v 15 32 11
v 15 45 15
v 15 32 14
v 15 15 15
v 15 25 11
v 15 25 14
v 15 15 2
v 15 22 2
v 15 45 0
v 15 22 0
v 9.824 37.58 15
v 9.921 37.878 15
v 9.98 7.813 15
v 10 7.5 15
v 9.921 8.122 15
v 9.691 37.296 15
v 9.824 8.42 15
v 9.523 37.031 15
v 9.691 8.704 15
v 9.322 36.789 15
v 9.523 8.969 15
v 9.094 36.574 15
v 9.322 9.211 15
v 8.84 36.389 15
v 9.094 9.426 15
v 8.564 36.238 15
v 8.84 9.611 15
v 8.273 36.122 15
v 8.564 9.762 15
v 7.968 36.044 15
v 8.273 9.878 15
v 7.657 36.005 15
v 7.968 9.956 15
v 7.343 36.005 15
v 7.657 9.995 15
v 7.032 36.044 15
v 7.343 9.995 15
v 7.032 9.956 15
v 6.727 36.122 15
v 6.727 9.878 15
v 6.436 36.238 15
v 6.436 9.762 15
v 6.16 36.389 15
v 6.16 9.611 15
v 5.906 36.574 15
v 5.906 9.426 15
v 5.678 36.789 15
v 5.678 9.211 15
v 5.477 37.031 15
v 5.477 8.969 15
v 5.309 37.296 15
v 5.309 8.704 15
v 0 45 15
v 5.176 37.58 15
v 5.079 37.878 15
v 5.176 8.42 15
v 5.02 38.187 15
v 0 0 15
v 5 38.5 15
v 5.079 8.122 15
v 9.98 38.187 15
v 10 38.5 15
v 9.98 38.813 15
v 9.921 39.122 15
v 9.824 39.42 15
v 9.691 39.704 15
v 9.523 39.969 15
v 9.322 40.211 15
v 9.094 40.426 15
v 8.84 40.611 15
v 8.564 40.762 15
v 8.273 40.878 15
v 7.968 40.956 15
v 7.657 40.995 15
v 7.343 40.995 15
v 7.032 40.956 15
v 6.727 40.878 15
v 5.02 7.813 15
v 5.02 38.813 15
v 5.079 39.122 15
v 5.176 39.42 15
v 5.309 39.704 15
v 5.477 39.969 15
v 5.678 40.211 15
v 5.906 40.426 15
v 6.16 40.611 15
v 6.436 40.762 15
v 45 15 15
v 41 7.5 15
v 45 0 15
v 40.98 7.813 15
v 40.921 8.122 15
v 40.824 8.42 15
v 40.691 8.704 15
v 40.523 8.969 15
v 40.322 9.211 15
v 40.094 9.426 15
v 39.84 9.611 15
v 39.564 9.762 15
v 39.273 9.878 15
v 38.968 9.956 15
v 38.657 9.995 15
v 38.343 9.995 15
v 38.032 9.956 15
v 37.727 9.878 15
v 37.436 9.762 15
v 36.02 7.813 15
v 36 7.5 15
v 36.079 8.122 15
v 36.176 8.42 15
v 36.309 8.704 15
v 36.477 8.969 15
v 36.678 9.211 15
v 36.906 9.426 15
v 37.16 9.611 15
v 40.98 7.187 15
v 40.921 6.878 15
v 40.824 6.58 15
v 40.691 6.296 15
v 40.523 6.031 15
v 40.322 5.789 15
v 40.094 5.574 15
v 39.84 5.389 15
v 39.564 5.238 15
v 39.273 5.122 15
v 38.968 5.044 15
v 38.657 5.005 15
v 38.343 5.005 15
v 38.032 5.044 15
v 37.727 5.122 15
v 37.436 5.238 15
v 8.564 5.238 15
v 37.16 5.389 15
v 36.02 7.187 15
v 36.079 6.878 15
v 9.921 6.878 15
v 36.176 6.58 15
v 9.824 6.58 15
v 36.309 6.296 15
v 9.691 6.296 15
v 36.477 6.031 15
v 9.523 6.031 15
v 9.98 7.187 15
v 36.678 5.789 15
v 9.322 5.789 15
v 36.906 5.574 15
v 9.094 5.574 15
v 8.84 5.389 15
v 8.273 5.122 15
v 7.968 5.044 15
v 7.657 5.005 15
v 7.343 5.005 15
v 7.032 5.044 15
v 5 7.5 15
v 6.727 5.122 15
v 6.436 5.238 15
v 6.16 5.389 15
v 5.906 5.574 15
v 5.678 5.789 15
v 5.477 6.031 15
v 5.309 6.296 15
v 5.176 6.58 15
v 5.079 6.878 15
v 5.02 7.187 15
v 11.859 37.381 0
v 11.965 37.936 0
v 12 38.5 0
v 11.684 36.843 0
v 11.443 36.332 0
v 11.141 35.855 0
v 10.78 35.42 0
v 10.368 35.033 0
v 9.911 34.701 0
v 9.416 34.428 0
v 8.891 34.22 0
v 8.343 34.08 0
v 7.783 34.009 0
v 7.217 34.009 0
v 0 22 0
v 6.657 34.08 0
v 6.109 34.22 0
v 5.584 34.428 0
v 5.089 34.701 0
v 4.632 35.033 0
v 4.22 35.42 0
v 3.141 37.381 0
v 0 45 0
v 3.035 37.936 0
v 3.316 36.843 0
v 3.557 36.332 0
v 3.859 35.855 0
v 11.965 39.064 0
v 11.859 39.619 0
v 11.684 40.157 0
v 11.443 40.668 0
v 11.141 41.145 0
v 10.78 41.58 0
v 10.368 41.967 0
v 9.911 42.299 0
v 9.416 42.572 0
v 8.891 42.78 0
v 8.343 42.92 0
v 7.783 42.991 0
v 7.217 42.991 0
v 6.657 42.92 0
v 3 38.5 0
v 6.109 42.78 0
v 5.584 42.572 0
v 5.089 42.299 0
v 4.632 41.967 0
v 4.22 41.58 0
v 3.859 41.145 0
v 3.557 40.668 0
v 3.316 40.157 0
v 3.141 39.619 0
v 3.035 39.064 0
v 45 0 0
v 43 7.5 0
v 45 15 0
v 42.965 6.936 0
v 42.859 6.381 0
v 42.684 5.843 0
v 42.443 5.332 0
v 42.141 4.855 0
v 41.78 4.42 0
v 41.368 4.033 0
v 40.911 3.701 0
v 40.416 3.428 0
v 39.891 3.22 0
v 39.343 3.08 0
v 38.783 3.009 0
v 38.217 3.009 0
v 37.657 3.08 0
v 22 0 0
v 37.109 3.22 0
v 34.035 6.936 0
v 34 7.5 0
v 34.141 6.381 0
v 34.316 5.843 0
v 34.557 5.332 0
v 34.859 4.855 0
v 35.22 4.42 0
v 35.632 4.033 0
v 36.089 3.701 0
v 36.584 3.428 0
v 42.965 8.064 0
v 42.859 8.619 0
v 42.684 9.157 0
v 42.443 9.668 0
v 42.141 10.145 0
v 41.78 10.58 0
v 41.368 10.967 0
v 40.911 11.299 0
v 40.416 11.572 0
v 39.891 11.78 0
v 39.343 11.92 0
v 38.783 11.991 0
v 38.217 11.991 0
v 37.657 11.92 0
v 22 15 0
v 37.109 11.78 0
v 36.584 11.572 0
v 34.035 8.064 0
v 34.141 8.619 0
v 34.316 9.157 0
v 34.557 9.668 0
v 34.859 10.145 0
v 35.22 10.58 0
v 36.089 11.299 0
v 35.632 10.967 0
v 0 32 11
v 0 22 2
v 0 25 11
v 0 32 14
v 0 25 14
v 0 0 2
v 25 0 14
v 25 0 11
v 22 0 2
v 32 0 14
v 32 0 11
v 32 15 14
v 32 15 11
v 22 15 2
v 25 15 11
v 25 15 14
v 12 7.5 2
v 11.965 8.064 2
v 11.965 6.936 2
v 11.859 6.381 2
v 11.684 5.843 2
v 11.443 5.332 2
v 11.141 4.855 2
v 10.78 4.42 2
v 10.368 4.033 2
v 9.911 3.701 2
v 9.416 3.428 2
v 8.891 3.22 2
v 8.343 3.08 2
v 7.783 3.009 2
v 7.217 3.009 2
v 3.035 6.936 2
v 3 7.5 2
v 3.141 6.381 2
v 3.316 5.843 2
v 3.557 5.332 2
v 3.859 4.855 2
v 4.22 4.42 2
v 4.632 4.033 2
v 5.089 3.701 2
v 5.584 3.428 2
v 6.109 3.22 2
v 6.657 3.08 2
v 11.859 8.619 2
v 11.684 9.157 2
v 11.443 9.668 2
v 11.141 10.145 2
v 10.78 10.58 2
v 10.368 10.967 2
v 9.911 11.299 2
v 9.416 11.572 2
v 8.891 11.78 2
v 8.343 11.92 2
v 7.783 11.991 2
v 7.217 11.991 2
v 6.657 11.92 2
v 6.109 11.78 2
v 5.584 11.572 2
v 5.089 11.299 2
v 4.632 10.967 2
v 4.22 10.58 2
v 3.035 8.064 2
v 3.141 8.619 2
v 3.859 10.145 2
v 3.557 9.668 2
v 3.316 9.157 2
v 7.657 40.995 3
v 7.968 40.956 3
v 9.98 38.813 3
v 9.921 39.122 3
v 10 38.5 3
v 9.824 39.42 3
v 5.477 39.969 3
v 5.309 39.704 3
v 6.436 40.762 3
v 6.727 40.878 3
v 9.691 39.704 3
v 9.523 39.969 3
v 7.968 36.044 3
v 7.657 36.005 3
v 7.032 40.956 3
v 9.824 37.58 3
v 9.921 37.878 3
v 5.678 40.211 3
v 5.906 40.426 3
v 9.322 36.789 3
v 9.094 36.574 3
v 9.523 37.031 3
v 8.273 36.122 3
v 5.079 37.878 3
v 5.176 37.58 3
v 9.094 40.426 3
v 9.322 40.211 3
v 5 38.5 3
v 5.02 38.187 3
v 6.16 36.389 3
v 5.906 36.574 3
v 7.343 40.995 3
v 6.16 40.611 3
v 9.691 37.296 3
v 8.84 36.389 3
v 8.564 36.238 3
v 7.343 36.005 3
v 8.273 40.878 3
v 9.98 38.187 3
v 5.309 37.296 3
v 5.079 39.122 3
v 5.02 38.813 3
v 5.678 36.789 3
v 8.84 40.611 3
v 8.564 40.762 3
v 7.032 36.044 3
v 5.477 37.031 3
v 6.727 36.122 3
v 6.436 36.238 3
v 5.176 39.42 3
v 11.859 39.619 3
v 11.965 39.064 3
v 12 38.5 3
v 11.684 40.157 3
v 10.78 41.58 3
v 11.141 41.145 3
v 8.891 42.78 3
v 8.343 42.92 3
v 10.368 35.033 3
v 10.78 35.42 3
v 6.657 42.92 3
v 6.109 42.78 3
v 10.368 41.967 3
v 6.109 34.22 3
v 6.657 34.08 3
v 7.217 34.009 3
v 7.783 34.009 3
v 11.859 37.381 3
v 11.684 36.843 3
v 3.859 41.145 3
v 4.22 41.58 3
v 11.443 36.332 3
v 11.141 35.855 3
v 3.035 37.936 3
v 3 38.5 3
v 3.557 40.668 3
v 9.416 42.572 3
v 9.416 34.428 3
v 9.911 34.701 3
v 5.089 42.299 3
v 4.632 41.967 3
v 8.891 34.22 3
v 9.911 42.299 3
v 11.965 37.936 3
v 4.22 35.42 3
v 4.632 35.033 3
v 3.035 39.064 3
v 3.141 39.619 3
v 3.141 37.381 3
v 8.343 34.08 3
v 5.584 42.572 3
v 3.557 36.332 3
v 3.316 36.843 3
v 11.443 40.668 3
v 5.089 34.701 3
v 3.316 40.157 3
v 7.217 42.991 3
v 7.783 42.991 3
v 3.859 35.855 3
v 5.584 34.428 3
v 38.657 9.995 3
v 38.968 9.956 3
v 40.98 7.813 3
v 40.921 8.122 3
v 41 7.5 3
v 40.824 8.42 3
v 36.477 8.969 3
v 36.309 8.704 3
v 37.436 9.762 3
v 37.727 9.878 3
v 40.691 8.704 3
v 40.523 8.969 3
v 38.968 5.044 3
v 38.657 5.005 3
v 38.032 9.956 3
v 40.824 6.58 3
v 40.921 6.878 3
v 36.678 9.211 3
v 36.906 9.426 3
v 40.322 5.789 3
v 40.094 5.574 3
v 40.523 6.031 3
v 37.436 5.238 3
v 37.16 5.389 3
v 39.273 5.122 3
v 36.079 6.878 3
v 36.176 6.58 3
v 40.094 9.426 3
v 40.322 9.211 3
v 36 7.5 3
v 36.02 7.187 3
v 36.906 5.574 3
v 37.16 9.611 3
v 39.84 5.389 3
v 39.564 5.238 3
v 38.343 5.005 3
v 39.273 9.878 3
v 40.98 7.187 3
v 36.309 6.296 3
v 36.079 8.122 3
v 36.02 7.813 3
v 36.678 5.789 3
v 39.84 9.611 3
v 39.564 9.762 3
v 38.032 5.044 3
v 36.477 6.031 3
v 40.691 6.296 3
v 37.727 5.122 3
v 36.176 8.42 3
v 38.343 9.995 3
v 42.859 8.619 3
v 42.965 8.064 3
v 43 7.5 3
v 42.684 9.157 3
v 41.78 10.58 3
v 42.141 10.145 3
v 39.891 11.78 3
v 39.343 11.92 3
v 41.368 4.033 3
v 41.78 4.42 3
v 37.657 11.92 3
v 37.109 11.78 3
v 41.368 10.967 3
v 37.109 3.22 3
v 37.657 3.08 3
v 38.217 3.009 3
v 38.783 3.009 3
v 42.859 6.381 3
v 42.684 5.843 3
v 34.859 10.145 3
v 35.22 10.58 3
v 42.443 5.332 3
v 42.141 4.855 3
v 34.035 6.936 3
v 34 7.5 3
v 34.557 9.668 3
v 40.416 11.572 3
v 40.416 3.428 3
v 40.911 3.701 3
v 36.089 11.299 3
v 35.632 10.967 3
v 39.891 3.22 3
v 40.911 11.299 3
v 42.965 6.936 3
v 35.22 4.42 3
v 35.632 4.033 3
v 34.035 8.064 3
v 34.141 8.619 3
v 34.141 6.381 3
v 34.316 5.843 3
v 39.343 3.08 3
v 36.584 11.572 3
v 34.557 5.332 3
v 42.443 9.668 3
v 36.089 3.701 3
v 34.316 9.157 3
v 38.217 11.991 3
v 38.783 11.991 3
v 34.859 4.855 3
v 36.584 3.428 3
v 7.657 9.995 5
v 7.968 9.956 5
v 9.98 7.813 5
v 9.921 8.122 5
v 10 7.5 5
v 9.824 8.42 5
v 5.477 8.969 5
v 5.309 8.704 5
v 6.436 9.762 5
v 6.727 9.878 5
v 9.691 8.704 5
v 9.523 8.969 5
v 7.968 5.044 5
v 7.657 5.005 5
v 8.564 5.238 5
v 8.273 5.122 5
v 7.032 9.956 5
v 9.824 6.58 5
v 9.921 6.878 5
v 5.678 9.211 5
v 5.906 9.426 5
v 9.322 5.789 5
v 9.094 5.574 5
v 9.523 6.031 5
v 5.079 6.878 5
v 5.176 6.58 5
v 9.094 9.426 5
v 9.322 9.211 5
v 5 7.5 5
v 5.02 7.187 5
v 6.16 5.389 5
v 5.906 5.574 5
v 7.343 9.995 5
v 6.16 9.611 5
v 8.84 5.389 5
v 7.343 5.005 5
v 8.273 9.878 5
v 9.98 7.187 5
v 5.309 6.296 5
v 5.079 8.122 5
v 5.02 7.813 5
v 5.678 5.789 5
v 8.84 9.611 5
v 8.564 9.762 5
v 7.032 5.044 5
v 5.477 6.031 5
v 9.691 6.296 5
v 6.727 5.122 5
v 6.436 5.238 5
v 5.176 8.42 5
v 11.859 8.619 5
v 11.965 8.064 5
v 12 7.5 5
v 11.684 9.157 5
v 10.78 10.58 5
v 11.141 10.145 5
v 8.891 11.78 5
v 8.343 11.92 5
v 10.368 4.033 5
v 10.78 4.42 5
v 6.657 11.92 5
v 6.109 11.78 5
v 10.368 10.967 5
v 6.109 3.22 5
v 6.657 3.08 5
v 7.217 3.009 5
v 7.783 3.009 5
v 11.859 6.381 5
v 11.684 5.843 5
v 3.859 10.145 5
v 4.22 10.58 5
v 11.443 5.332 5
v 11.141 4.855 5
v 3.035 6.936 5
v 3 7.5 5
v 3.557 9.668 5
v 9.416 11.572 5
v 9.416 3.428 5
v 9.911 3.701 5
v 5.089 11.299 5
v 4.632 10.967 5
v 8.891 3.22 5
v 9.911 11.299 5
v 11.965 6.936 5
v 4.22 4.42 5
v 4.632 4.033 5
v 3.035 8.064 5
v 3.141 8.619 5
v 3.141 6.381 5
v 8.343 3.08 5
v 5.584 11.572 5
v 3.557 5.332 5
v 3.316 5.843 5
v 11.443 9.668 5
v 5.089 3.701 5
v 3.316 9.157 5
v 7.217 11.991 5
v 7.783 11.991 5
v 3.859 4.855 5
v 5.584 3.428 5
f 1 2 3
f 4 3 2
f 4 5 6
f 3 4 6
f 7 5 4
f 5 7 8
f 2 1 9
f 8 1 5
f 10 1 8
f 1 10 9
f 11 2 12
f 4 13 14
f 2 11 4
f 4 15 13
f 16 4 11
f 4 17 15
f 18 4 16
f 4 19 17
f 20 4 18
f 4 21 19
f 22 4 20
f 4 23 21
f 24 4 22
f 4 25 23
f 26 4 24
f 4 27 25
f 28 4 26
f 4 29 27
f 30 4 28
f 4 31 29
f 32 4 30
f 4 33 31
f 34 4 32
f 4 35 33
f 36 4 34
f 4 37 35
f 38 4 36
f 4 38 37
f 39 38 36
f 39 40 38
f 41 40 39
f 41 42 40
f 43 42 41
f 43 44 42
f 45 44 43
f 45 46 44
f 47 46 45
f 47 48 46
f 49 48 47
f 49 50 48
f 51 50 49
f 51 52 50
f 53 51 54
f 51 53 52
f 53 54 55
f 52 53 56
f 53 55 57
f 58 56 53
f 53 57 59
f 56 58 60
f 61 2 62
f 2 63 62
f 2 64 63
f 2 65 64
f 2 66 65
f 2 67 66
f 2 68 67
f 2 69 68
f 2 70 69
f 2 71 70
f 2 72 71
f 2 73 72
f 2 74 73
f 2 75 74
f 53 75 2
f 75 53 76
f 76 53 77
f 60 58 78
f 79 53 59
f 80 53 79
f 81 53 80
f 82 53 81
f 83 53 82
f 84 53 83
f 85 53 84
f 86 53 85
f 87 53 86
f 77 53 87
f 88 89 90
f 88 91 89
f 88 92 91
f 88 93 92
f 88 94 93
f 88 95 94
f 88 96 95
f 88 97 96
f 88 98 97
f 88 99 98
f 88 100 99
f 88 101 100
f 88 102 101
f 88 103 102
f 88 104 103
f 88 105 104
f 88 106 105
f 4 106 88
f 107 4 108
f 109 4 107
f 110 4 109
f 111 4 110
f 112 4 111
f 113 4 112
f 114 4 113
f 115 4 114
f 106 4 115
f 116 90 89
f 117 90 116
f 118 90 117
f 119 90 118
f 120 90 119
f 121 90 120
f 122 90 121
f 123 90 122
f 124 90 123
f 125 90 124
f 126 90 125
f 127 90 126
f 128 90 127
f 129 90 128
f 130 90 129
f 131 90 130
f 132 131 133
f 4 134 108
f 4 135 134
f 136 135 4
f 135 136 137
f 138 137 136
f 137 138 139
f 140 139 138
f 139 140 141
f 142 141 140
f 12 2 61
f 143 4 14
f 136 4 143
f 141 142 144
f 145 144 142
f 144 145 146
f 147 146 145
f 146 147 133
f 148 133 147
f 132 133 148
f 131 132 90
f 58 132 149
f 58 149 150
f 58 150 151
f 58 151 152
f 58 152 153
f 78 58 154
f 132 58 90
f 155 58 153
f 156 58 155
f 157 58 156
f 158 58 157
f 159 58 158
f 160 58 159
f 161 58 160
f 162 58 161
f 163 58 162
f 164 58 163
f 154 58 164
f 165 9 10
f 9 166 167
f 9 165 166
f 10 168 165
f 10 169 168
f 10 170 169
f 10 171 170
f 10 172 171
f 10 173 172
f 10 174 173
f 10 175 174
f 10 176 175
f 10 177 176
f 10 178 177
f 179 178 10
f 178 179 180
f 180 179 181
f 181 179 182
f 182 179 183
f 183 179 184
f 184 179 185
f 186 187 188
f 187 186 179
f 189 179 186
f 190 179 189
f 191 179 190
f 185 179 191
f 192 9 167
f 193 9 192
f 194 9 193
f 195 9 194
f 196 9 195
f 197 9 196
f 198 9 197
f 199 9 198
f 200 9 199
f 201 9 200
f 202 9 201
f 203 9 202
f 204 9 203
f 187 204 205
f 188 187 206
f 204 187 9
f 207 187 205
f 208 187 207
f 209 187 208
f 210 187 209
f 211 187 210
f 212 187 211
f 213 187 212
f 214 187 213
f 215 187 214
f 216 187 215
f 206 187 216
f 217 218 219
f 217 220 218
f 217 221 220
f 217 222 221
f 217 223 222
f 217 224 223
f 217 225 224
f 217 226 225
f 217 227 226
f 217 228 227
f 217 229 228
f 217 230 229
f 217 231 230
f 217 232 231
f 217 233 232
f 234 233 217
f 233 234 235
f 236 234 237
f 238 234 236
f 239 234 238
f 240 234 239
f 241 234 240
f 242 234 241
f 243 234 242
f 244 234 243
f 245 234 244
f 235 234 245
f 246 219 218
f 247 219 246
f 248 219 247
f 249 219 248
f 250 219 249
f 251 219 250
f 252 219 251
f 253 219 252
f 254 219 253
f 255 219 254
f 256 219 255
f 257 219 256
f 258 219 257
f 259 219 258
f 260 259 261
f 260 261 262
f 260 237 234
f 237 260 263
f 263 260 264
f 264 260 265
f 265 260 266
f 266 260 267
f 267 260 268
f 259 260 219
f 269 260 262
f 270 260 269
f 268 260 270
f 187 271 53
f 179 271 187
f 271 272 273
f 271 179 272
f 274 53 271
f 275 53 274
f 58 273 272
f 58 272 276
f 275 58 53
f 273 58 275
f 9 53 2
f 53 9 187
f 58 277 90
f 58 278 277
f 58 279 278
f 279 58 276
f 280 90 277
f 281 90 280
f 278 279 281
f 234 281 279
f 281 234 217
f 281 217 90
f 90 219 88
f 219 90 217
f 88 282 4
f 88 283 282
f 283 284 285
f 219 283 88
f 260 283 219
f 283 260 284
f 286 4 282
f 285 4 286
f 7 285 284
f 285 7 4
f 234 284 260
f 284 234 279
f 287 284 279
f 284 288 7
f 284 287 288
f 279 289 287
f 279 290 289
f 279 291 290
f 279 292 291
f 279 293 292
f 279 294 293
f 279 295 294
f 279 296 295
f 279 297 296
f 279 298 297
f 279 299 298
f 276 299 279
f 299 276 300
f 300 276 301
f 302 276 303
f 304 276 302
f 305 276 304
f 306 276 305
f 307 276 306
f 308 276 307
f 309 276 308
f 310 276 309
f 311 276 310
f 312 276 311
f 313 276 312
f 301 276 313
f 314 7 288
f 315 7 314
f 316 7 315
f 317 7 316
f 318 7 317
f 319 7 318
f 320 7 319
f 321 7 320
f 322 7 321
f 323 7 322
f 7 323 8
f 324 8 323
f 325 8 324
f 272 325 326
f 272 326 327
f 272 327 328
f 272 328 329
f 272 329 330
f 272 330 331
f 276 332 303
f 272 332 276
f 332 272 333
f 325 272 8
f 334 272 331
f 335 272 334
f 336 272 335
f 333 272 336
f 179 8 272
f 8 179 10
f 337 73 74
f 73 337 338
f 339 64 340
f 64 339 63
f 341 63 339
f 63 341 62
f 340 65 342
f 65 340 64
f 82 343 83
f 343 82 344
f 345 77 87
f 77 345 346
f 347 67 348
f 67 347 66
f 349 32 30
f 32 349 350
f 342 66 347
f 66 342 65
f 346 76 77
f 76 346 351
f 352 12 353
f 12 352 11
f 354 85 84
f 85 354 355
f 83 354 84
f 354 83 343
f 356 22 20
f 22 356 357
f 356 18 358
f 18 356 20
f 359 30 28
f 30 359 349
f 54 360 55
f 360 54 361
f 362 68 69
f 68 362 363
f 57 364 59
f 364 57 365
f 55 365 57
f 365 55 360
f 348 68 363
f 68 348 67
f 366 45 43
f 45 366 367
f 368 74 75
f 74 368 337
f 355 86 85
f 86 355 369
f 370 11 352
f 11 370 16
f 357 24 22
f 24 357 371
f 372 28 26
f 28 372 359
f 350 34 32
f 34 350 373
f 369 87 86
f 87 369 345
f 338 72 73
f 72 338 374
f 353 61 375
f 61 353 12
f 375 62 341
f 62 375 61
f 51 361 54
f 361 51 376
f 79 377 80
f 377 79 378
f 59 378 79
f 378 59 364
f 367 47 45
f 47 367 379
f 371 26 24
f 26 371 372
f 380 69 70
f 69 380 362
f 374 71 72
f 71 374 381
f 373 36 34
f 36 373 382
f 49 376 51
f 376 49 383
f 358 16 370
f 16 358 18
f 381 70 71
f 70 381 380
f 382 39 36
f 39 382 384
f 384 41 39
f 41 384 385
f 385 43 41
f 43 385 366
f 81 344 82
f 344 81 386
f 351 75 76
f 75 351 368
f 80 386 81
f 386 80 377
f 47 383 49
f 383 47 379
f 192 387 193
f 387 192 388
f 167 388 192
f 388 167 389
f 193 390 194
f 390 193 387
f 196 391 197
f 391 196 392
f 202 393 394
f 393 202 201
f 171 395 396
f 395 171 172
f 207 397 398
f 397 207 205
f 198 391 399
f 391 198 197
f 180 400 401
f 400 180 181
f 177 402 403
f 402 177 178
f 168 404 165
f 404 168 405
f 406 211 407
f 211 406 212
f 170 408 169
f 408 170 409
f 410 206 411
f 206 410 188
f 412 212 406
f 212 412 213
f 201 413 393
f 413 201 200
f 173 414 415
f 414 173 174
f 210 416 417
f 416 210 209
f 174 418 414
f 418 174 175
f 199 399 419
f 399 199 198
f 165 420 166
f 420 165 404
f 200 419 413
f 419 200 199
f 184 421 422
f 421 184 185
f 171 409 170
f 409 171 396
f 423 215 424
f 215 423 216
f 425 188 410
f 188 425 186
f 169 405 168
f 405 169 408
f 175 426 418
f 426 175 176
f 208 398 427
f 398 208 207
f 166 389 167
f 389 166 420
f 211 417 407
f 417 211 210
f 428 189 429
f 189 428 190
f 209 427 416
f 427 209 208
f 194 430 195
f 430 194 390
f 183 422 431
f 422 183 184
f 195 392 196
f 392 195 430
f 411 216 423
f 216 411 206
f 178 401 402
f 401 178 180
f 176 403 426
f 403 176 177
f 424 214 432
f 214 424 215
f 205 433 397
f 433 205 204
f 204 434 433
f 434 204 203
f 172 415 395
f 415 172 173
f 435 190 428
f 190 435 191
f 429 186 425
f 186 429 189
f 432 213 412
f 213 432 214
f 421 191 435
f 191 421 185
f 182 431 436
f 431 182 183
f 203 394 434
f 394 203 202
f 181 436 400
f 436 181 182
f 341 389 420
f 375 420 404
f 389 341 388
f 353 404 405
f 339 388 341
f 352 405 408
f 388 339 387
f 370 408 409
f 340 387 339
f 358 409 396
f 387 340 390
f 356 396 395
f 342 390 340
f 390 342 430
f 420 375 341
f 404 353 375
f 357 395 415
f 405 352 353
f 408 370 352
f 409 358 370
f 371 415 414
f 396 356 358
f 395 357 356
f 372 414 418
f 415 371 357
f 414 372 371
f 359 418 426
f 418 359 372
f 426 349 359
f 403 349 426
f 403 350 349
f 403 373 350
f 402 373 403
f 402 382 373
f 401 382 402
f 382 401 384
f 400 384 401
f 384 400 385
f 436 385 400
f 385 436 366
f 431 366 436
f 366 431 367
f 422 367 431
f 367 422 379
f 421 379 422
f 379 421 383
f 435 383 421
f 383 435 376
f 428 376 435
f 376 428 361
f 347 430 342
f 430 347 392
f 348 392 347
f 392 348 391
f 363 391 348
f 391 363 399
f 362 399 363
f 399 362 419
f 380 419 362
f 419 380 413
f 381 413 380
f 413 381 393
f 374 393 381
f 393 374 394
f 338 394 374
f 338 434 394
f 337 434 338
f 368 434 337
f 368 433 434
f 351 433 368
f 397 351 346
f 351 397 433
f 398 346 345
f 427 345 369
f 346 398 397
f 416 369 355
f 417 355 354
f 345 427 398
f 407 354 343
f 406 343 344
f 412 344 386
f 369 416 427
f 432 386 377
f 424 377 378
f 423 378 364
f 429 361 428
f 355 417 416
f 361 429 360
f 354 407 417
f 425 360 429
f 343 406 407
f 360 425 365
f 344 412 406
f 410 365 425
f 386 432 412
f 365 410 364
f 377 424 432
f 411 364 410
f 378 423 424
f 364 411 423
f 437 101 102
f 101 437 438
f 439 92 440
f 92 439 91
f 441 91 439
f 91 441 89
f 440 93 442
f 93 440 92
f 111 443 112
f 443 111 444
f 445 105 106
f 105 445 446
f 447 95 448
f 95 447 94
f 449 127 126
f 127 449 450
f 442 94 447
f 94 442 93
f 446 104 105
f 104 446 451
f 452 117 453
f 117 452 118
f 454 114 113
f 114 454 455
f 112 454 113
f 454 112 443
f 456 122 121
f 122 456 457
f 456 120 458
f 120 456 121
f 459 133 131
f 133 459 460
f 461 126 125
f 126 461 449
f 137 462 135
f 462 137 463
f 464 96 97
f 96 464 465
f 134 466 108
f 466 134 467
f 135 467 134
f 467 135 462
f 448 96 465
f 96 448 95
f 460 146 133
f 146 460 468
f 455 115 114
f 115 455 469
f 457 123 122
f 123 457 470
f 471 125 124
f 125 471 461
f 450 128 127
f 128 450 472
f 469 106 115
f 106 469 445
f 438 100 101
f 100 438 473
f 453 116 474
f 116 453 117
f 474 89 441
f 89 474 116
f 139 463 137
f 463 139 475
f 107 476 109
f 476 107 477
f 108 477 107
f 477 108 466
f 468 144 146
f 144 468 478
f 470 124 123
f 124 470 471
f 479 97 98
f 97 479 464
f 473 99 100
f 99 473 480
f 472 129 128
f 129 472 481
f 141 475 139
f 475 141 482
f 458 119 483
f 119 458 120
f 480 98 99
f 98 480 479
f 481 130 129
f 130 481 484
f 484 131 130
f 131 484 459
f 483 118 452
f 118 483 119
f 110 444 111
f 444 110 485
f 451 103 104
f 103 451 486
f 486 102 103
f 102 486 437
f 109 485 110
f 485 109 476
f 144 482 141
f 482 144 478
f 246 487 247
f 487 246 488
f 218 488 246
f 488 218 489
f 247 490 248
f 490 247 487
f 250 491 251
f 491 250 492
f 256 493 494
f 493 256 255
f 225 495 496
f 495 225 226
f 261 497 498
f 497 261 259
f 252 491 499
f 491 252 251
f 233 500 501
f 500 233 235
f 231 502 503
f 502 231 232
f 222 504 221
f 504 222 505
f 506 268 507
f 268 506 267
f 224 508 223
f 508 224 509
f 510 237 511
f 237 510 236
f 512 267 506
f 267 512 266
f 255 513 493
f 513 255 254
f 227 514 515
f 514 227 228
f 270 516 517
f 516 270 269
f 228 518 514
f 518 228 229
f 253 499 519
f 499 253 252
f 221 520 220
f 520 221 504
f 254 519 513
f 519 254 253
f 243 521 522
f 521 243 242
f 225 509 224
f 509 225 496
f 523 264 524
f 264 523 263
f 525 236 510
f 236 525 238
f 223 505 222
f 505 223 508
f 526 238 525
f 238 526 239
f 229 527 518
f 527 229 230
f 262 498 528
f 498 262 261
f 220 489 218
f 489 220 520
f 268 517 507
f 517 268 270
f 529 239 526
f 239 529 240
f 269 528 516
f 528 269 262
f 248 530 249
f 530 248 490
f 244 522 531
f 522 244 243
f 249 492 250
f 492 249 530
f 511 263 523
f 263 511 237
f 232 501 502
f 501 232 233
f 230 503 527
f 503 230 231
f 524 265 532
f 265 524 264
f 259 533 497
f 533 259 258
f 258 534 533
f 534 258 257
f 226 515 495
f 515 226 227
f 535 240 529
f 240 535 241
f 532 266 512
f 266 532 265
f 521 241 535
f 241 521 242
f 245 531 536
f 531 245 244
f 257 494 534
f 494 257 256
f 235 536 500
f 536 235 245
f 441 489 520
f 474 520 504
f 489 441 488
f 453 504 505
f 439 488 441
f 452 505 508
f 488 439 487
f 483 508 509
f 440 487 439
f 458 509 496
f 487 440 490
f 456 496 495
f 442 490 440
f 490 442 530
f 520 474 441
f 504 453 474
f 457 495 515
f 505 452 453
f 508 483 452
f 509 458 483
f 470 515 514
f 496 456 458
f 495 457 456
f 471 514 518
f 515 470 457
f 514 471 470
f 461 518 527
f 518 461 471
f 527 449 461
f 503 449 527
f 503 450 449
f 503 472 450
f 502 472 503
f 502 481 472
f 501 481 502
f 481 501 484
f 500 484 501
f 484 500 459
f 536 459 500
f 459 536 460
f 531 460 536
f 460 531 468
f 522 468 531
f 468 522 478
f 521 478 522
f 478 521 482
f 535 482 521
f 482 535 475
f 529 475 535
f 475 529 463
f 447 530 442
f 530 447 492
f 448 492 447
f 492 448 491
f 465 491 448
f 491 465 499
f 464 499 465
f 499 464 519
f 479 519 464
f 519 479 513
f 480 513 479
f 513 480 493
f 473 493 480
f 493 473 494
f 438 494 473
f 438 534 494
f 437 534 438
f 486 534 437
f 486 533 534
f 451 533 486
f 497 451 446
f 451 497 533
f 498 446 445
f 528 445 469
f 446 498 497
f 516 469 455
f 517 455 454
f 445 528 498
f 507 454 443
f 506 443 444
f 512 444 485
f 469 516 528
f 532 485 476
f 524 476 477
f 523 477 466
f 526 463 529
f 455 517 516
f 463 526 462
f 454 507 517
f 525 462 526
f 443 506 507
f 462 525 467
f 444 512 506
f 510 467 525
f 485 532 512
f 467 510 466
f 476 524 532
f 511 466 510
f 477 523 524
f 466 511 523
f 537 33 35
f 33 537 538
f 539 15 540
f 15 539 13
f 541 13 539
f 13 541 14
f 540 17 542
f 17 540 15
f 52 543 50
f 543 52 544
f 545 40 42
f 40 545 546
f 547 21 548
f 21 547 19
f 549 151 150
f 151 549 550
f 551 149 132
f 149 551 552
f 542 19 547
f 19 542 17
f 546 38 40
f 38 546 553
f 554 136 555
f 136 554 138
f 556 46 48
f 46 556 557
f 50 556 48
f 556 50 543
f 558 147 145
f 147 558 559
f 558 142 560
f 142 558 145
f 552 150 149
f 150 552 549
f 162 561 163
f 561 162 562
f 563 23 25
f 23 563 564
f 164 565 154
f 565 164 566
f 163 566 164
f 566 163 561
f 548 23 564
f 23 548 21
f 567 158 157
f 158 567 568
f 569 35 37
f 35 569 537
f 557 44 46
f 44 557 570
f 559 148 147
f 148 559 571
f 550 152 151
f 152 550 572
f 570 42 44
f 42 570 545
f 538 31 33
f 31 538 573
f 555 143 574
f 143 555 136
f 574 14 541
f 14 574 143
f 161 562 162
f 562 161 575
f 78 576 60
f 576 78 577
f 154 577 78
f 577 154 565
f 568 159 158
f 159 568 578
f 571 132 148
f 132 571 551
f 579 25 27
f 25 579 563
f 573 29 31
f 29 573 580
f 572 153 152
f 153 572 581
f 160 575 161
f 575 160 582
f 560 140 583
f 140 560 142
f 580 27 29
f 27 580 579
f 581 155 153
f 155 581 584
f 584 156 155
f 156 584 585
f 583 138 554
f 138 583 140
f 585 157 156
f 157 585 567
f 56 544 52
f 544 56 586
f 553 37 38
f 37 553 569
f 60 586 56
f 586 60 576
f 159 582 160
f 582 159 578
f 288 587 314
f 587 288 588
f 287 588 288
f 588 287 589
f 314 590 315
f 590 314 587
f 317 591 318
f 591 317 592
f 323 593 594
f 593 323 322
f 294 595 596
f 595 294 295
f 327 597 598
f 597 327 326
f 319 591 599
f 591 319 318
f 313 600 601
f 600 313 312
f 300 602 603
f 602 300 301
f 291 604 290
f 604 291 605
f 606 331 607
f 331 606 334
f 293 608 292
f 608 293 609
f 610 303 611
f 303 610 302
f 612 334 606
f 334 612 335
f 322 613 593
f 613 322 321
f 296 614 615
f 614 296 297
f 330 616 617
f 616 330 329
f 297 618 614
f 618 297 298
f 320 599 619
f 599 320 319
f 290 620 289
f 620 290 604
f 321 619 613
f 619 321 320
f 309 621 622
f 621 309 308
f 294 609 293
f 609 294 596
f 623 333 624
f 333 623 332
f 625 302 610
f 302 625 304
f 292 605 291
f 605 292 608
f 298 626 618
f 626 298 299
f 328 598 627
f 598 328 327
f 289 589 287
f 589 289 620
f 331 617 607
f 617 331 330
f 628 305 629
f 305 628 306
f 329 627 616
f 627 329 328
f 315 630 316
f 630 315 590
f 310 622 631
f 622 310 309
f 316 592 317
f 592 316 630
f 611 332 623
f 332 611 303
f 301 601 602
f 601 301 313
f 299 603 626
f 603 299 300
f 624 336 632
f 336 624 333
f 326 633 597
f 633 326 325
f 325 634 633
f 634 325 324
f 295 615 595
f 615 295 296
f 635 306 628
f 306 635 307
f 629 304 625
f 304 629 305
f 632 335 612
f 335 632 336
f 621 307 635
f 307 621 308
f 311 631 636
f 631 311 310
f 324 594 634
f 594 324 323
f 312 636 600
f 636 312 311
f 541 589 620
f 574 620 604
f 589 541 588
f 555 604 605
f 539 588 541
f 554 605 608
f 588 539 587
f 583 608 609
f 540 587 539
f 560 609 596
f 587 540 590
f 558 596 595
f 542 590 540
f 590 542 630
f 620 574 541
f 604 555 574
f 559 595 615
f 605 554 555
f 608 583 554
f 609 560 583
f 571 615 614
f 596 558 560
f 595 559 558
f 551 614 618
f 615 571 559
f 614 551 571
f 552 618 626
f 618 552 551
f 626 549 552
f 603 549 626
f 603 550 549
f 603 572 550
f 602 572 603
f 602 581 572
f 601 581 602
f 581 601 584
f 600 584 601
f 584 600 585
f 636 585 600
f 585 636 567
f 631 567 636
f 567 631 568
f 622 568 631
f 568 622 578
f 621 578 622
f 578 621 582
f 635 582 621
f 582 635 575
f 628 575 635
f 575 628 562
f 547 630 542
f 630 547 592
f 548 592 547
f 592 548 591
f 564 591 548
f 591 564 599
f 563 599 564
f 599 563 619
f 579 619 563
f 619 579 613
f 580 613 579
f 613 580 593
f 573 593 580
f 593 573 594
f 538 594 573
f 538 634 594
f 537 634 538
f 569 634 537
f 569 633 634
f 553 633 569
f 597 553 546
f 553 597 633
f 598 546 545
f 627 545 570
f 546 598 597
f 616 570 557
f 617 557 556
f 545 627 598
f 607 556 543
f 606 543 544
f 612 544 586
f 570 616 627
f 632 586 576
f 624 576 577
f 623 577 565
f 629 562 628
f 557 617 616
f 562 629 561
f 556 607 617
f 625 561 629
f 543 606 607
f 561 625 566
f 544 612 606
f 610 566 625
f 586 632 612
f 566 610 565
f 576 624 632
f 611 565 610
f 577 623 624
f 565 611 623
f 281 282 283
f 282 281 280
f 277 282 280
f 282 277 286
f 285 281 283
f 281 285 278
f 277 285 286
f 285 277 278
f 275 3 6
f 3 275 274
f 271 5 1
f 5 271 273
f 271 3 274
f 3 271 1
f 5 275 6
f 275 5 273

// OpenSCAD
w = 15;
l = 45;
h = 15;
strap_h = 3;
strap_w = 7;
strap_inset = 1;

head_d = 9;
body_d = 5;
hole_dist = 2;
hole_inset = 3;

groove_l = w + 7;
groove_h = 2;

difference() {
    // Corpo principal
    union() {
        cube( [ w, l, h ] );
        cube( [ l, w, h ] );
    }
    
    // Cavado para solda no canto:
    translate( [ -1, -1, -1 ] )
        cube( [ groove_l + 1, groove_l + 1, groove_h + 1 ] );
    
    // Furos para parafusos:
    translate( [ w / 2, l - head_d / 2 - hole_dist, -1 ] )
        cylinder( d = body_d, h = h + 2, $fn = 50 );
    translate( [ w / 2, l - head_d / 2 - hole_dist, hole_inset - h ] )
        cylinder( d = head_d, h = h, $fn = 50 );

    translate( [ l - head_d / 2 - hole_dist, w / 2, -1 ] )
        cylinder( d = body_d, h = h + 2, $fn = 50 );
    translate( [ l - head_d / 2 - hole_dist, w / 2, hole_inset - h ] )
        cylinder( d = head_d, h = h, $fn = 50 );

    translate( [ w / 2, w / 2, -1 ] )
        cylinder( d = body_d, h = h + 2, $fn = 50 );
    translate( [ w / 2, w / 2, hole_inset - h + groove_h ] )
        cylinder( d = head_d, h = h, $fn = 50 );

    // Furos para amarras:
    translate( [ l - strap_w - head_d - 2 * hole_dist, -1, h - strap_h - strap_inset ] )
        cube( [ strap_w, l + 2, strap_h ] );    


    translate( [ -1, l - strap_w - head_d - 2 * hole_dist,  h - strap_h - strap_inset ] )
        cube( [ l + 2, strap_w, strap_h ] );    
}
